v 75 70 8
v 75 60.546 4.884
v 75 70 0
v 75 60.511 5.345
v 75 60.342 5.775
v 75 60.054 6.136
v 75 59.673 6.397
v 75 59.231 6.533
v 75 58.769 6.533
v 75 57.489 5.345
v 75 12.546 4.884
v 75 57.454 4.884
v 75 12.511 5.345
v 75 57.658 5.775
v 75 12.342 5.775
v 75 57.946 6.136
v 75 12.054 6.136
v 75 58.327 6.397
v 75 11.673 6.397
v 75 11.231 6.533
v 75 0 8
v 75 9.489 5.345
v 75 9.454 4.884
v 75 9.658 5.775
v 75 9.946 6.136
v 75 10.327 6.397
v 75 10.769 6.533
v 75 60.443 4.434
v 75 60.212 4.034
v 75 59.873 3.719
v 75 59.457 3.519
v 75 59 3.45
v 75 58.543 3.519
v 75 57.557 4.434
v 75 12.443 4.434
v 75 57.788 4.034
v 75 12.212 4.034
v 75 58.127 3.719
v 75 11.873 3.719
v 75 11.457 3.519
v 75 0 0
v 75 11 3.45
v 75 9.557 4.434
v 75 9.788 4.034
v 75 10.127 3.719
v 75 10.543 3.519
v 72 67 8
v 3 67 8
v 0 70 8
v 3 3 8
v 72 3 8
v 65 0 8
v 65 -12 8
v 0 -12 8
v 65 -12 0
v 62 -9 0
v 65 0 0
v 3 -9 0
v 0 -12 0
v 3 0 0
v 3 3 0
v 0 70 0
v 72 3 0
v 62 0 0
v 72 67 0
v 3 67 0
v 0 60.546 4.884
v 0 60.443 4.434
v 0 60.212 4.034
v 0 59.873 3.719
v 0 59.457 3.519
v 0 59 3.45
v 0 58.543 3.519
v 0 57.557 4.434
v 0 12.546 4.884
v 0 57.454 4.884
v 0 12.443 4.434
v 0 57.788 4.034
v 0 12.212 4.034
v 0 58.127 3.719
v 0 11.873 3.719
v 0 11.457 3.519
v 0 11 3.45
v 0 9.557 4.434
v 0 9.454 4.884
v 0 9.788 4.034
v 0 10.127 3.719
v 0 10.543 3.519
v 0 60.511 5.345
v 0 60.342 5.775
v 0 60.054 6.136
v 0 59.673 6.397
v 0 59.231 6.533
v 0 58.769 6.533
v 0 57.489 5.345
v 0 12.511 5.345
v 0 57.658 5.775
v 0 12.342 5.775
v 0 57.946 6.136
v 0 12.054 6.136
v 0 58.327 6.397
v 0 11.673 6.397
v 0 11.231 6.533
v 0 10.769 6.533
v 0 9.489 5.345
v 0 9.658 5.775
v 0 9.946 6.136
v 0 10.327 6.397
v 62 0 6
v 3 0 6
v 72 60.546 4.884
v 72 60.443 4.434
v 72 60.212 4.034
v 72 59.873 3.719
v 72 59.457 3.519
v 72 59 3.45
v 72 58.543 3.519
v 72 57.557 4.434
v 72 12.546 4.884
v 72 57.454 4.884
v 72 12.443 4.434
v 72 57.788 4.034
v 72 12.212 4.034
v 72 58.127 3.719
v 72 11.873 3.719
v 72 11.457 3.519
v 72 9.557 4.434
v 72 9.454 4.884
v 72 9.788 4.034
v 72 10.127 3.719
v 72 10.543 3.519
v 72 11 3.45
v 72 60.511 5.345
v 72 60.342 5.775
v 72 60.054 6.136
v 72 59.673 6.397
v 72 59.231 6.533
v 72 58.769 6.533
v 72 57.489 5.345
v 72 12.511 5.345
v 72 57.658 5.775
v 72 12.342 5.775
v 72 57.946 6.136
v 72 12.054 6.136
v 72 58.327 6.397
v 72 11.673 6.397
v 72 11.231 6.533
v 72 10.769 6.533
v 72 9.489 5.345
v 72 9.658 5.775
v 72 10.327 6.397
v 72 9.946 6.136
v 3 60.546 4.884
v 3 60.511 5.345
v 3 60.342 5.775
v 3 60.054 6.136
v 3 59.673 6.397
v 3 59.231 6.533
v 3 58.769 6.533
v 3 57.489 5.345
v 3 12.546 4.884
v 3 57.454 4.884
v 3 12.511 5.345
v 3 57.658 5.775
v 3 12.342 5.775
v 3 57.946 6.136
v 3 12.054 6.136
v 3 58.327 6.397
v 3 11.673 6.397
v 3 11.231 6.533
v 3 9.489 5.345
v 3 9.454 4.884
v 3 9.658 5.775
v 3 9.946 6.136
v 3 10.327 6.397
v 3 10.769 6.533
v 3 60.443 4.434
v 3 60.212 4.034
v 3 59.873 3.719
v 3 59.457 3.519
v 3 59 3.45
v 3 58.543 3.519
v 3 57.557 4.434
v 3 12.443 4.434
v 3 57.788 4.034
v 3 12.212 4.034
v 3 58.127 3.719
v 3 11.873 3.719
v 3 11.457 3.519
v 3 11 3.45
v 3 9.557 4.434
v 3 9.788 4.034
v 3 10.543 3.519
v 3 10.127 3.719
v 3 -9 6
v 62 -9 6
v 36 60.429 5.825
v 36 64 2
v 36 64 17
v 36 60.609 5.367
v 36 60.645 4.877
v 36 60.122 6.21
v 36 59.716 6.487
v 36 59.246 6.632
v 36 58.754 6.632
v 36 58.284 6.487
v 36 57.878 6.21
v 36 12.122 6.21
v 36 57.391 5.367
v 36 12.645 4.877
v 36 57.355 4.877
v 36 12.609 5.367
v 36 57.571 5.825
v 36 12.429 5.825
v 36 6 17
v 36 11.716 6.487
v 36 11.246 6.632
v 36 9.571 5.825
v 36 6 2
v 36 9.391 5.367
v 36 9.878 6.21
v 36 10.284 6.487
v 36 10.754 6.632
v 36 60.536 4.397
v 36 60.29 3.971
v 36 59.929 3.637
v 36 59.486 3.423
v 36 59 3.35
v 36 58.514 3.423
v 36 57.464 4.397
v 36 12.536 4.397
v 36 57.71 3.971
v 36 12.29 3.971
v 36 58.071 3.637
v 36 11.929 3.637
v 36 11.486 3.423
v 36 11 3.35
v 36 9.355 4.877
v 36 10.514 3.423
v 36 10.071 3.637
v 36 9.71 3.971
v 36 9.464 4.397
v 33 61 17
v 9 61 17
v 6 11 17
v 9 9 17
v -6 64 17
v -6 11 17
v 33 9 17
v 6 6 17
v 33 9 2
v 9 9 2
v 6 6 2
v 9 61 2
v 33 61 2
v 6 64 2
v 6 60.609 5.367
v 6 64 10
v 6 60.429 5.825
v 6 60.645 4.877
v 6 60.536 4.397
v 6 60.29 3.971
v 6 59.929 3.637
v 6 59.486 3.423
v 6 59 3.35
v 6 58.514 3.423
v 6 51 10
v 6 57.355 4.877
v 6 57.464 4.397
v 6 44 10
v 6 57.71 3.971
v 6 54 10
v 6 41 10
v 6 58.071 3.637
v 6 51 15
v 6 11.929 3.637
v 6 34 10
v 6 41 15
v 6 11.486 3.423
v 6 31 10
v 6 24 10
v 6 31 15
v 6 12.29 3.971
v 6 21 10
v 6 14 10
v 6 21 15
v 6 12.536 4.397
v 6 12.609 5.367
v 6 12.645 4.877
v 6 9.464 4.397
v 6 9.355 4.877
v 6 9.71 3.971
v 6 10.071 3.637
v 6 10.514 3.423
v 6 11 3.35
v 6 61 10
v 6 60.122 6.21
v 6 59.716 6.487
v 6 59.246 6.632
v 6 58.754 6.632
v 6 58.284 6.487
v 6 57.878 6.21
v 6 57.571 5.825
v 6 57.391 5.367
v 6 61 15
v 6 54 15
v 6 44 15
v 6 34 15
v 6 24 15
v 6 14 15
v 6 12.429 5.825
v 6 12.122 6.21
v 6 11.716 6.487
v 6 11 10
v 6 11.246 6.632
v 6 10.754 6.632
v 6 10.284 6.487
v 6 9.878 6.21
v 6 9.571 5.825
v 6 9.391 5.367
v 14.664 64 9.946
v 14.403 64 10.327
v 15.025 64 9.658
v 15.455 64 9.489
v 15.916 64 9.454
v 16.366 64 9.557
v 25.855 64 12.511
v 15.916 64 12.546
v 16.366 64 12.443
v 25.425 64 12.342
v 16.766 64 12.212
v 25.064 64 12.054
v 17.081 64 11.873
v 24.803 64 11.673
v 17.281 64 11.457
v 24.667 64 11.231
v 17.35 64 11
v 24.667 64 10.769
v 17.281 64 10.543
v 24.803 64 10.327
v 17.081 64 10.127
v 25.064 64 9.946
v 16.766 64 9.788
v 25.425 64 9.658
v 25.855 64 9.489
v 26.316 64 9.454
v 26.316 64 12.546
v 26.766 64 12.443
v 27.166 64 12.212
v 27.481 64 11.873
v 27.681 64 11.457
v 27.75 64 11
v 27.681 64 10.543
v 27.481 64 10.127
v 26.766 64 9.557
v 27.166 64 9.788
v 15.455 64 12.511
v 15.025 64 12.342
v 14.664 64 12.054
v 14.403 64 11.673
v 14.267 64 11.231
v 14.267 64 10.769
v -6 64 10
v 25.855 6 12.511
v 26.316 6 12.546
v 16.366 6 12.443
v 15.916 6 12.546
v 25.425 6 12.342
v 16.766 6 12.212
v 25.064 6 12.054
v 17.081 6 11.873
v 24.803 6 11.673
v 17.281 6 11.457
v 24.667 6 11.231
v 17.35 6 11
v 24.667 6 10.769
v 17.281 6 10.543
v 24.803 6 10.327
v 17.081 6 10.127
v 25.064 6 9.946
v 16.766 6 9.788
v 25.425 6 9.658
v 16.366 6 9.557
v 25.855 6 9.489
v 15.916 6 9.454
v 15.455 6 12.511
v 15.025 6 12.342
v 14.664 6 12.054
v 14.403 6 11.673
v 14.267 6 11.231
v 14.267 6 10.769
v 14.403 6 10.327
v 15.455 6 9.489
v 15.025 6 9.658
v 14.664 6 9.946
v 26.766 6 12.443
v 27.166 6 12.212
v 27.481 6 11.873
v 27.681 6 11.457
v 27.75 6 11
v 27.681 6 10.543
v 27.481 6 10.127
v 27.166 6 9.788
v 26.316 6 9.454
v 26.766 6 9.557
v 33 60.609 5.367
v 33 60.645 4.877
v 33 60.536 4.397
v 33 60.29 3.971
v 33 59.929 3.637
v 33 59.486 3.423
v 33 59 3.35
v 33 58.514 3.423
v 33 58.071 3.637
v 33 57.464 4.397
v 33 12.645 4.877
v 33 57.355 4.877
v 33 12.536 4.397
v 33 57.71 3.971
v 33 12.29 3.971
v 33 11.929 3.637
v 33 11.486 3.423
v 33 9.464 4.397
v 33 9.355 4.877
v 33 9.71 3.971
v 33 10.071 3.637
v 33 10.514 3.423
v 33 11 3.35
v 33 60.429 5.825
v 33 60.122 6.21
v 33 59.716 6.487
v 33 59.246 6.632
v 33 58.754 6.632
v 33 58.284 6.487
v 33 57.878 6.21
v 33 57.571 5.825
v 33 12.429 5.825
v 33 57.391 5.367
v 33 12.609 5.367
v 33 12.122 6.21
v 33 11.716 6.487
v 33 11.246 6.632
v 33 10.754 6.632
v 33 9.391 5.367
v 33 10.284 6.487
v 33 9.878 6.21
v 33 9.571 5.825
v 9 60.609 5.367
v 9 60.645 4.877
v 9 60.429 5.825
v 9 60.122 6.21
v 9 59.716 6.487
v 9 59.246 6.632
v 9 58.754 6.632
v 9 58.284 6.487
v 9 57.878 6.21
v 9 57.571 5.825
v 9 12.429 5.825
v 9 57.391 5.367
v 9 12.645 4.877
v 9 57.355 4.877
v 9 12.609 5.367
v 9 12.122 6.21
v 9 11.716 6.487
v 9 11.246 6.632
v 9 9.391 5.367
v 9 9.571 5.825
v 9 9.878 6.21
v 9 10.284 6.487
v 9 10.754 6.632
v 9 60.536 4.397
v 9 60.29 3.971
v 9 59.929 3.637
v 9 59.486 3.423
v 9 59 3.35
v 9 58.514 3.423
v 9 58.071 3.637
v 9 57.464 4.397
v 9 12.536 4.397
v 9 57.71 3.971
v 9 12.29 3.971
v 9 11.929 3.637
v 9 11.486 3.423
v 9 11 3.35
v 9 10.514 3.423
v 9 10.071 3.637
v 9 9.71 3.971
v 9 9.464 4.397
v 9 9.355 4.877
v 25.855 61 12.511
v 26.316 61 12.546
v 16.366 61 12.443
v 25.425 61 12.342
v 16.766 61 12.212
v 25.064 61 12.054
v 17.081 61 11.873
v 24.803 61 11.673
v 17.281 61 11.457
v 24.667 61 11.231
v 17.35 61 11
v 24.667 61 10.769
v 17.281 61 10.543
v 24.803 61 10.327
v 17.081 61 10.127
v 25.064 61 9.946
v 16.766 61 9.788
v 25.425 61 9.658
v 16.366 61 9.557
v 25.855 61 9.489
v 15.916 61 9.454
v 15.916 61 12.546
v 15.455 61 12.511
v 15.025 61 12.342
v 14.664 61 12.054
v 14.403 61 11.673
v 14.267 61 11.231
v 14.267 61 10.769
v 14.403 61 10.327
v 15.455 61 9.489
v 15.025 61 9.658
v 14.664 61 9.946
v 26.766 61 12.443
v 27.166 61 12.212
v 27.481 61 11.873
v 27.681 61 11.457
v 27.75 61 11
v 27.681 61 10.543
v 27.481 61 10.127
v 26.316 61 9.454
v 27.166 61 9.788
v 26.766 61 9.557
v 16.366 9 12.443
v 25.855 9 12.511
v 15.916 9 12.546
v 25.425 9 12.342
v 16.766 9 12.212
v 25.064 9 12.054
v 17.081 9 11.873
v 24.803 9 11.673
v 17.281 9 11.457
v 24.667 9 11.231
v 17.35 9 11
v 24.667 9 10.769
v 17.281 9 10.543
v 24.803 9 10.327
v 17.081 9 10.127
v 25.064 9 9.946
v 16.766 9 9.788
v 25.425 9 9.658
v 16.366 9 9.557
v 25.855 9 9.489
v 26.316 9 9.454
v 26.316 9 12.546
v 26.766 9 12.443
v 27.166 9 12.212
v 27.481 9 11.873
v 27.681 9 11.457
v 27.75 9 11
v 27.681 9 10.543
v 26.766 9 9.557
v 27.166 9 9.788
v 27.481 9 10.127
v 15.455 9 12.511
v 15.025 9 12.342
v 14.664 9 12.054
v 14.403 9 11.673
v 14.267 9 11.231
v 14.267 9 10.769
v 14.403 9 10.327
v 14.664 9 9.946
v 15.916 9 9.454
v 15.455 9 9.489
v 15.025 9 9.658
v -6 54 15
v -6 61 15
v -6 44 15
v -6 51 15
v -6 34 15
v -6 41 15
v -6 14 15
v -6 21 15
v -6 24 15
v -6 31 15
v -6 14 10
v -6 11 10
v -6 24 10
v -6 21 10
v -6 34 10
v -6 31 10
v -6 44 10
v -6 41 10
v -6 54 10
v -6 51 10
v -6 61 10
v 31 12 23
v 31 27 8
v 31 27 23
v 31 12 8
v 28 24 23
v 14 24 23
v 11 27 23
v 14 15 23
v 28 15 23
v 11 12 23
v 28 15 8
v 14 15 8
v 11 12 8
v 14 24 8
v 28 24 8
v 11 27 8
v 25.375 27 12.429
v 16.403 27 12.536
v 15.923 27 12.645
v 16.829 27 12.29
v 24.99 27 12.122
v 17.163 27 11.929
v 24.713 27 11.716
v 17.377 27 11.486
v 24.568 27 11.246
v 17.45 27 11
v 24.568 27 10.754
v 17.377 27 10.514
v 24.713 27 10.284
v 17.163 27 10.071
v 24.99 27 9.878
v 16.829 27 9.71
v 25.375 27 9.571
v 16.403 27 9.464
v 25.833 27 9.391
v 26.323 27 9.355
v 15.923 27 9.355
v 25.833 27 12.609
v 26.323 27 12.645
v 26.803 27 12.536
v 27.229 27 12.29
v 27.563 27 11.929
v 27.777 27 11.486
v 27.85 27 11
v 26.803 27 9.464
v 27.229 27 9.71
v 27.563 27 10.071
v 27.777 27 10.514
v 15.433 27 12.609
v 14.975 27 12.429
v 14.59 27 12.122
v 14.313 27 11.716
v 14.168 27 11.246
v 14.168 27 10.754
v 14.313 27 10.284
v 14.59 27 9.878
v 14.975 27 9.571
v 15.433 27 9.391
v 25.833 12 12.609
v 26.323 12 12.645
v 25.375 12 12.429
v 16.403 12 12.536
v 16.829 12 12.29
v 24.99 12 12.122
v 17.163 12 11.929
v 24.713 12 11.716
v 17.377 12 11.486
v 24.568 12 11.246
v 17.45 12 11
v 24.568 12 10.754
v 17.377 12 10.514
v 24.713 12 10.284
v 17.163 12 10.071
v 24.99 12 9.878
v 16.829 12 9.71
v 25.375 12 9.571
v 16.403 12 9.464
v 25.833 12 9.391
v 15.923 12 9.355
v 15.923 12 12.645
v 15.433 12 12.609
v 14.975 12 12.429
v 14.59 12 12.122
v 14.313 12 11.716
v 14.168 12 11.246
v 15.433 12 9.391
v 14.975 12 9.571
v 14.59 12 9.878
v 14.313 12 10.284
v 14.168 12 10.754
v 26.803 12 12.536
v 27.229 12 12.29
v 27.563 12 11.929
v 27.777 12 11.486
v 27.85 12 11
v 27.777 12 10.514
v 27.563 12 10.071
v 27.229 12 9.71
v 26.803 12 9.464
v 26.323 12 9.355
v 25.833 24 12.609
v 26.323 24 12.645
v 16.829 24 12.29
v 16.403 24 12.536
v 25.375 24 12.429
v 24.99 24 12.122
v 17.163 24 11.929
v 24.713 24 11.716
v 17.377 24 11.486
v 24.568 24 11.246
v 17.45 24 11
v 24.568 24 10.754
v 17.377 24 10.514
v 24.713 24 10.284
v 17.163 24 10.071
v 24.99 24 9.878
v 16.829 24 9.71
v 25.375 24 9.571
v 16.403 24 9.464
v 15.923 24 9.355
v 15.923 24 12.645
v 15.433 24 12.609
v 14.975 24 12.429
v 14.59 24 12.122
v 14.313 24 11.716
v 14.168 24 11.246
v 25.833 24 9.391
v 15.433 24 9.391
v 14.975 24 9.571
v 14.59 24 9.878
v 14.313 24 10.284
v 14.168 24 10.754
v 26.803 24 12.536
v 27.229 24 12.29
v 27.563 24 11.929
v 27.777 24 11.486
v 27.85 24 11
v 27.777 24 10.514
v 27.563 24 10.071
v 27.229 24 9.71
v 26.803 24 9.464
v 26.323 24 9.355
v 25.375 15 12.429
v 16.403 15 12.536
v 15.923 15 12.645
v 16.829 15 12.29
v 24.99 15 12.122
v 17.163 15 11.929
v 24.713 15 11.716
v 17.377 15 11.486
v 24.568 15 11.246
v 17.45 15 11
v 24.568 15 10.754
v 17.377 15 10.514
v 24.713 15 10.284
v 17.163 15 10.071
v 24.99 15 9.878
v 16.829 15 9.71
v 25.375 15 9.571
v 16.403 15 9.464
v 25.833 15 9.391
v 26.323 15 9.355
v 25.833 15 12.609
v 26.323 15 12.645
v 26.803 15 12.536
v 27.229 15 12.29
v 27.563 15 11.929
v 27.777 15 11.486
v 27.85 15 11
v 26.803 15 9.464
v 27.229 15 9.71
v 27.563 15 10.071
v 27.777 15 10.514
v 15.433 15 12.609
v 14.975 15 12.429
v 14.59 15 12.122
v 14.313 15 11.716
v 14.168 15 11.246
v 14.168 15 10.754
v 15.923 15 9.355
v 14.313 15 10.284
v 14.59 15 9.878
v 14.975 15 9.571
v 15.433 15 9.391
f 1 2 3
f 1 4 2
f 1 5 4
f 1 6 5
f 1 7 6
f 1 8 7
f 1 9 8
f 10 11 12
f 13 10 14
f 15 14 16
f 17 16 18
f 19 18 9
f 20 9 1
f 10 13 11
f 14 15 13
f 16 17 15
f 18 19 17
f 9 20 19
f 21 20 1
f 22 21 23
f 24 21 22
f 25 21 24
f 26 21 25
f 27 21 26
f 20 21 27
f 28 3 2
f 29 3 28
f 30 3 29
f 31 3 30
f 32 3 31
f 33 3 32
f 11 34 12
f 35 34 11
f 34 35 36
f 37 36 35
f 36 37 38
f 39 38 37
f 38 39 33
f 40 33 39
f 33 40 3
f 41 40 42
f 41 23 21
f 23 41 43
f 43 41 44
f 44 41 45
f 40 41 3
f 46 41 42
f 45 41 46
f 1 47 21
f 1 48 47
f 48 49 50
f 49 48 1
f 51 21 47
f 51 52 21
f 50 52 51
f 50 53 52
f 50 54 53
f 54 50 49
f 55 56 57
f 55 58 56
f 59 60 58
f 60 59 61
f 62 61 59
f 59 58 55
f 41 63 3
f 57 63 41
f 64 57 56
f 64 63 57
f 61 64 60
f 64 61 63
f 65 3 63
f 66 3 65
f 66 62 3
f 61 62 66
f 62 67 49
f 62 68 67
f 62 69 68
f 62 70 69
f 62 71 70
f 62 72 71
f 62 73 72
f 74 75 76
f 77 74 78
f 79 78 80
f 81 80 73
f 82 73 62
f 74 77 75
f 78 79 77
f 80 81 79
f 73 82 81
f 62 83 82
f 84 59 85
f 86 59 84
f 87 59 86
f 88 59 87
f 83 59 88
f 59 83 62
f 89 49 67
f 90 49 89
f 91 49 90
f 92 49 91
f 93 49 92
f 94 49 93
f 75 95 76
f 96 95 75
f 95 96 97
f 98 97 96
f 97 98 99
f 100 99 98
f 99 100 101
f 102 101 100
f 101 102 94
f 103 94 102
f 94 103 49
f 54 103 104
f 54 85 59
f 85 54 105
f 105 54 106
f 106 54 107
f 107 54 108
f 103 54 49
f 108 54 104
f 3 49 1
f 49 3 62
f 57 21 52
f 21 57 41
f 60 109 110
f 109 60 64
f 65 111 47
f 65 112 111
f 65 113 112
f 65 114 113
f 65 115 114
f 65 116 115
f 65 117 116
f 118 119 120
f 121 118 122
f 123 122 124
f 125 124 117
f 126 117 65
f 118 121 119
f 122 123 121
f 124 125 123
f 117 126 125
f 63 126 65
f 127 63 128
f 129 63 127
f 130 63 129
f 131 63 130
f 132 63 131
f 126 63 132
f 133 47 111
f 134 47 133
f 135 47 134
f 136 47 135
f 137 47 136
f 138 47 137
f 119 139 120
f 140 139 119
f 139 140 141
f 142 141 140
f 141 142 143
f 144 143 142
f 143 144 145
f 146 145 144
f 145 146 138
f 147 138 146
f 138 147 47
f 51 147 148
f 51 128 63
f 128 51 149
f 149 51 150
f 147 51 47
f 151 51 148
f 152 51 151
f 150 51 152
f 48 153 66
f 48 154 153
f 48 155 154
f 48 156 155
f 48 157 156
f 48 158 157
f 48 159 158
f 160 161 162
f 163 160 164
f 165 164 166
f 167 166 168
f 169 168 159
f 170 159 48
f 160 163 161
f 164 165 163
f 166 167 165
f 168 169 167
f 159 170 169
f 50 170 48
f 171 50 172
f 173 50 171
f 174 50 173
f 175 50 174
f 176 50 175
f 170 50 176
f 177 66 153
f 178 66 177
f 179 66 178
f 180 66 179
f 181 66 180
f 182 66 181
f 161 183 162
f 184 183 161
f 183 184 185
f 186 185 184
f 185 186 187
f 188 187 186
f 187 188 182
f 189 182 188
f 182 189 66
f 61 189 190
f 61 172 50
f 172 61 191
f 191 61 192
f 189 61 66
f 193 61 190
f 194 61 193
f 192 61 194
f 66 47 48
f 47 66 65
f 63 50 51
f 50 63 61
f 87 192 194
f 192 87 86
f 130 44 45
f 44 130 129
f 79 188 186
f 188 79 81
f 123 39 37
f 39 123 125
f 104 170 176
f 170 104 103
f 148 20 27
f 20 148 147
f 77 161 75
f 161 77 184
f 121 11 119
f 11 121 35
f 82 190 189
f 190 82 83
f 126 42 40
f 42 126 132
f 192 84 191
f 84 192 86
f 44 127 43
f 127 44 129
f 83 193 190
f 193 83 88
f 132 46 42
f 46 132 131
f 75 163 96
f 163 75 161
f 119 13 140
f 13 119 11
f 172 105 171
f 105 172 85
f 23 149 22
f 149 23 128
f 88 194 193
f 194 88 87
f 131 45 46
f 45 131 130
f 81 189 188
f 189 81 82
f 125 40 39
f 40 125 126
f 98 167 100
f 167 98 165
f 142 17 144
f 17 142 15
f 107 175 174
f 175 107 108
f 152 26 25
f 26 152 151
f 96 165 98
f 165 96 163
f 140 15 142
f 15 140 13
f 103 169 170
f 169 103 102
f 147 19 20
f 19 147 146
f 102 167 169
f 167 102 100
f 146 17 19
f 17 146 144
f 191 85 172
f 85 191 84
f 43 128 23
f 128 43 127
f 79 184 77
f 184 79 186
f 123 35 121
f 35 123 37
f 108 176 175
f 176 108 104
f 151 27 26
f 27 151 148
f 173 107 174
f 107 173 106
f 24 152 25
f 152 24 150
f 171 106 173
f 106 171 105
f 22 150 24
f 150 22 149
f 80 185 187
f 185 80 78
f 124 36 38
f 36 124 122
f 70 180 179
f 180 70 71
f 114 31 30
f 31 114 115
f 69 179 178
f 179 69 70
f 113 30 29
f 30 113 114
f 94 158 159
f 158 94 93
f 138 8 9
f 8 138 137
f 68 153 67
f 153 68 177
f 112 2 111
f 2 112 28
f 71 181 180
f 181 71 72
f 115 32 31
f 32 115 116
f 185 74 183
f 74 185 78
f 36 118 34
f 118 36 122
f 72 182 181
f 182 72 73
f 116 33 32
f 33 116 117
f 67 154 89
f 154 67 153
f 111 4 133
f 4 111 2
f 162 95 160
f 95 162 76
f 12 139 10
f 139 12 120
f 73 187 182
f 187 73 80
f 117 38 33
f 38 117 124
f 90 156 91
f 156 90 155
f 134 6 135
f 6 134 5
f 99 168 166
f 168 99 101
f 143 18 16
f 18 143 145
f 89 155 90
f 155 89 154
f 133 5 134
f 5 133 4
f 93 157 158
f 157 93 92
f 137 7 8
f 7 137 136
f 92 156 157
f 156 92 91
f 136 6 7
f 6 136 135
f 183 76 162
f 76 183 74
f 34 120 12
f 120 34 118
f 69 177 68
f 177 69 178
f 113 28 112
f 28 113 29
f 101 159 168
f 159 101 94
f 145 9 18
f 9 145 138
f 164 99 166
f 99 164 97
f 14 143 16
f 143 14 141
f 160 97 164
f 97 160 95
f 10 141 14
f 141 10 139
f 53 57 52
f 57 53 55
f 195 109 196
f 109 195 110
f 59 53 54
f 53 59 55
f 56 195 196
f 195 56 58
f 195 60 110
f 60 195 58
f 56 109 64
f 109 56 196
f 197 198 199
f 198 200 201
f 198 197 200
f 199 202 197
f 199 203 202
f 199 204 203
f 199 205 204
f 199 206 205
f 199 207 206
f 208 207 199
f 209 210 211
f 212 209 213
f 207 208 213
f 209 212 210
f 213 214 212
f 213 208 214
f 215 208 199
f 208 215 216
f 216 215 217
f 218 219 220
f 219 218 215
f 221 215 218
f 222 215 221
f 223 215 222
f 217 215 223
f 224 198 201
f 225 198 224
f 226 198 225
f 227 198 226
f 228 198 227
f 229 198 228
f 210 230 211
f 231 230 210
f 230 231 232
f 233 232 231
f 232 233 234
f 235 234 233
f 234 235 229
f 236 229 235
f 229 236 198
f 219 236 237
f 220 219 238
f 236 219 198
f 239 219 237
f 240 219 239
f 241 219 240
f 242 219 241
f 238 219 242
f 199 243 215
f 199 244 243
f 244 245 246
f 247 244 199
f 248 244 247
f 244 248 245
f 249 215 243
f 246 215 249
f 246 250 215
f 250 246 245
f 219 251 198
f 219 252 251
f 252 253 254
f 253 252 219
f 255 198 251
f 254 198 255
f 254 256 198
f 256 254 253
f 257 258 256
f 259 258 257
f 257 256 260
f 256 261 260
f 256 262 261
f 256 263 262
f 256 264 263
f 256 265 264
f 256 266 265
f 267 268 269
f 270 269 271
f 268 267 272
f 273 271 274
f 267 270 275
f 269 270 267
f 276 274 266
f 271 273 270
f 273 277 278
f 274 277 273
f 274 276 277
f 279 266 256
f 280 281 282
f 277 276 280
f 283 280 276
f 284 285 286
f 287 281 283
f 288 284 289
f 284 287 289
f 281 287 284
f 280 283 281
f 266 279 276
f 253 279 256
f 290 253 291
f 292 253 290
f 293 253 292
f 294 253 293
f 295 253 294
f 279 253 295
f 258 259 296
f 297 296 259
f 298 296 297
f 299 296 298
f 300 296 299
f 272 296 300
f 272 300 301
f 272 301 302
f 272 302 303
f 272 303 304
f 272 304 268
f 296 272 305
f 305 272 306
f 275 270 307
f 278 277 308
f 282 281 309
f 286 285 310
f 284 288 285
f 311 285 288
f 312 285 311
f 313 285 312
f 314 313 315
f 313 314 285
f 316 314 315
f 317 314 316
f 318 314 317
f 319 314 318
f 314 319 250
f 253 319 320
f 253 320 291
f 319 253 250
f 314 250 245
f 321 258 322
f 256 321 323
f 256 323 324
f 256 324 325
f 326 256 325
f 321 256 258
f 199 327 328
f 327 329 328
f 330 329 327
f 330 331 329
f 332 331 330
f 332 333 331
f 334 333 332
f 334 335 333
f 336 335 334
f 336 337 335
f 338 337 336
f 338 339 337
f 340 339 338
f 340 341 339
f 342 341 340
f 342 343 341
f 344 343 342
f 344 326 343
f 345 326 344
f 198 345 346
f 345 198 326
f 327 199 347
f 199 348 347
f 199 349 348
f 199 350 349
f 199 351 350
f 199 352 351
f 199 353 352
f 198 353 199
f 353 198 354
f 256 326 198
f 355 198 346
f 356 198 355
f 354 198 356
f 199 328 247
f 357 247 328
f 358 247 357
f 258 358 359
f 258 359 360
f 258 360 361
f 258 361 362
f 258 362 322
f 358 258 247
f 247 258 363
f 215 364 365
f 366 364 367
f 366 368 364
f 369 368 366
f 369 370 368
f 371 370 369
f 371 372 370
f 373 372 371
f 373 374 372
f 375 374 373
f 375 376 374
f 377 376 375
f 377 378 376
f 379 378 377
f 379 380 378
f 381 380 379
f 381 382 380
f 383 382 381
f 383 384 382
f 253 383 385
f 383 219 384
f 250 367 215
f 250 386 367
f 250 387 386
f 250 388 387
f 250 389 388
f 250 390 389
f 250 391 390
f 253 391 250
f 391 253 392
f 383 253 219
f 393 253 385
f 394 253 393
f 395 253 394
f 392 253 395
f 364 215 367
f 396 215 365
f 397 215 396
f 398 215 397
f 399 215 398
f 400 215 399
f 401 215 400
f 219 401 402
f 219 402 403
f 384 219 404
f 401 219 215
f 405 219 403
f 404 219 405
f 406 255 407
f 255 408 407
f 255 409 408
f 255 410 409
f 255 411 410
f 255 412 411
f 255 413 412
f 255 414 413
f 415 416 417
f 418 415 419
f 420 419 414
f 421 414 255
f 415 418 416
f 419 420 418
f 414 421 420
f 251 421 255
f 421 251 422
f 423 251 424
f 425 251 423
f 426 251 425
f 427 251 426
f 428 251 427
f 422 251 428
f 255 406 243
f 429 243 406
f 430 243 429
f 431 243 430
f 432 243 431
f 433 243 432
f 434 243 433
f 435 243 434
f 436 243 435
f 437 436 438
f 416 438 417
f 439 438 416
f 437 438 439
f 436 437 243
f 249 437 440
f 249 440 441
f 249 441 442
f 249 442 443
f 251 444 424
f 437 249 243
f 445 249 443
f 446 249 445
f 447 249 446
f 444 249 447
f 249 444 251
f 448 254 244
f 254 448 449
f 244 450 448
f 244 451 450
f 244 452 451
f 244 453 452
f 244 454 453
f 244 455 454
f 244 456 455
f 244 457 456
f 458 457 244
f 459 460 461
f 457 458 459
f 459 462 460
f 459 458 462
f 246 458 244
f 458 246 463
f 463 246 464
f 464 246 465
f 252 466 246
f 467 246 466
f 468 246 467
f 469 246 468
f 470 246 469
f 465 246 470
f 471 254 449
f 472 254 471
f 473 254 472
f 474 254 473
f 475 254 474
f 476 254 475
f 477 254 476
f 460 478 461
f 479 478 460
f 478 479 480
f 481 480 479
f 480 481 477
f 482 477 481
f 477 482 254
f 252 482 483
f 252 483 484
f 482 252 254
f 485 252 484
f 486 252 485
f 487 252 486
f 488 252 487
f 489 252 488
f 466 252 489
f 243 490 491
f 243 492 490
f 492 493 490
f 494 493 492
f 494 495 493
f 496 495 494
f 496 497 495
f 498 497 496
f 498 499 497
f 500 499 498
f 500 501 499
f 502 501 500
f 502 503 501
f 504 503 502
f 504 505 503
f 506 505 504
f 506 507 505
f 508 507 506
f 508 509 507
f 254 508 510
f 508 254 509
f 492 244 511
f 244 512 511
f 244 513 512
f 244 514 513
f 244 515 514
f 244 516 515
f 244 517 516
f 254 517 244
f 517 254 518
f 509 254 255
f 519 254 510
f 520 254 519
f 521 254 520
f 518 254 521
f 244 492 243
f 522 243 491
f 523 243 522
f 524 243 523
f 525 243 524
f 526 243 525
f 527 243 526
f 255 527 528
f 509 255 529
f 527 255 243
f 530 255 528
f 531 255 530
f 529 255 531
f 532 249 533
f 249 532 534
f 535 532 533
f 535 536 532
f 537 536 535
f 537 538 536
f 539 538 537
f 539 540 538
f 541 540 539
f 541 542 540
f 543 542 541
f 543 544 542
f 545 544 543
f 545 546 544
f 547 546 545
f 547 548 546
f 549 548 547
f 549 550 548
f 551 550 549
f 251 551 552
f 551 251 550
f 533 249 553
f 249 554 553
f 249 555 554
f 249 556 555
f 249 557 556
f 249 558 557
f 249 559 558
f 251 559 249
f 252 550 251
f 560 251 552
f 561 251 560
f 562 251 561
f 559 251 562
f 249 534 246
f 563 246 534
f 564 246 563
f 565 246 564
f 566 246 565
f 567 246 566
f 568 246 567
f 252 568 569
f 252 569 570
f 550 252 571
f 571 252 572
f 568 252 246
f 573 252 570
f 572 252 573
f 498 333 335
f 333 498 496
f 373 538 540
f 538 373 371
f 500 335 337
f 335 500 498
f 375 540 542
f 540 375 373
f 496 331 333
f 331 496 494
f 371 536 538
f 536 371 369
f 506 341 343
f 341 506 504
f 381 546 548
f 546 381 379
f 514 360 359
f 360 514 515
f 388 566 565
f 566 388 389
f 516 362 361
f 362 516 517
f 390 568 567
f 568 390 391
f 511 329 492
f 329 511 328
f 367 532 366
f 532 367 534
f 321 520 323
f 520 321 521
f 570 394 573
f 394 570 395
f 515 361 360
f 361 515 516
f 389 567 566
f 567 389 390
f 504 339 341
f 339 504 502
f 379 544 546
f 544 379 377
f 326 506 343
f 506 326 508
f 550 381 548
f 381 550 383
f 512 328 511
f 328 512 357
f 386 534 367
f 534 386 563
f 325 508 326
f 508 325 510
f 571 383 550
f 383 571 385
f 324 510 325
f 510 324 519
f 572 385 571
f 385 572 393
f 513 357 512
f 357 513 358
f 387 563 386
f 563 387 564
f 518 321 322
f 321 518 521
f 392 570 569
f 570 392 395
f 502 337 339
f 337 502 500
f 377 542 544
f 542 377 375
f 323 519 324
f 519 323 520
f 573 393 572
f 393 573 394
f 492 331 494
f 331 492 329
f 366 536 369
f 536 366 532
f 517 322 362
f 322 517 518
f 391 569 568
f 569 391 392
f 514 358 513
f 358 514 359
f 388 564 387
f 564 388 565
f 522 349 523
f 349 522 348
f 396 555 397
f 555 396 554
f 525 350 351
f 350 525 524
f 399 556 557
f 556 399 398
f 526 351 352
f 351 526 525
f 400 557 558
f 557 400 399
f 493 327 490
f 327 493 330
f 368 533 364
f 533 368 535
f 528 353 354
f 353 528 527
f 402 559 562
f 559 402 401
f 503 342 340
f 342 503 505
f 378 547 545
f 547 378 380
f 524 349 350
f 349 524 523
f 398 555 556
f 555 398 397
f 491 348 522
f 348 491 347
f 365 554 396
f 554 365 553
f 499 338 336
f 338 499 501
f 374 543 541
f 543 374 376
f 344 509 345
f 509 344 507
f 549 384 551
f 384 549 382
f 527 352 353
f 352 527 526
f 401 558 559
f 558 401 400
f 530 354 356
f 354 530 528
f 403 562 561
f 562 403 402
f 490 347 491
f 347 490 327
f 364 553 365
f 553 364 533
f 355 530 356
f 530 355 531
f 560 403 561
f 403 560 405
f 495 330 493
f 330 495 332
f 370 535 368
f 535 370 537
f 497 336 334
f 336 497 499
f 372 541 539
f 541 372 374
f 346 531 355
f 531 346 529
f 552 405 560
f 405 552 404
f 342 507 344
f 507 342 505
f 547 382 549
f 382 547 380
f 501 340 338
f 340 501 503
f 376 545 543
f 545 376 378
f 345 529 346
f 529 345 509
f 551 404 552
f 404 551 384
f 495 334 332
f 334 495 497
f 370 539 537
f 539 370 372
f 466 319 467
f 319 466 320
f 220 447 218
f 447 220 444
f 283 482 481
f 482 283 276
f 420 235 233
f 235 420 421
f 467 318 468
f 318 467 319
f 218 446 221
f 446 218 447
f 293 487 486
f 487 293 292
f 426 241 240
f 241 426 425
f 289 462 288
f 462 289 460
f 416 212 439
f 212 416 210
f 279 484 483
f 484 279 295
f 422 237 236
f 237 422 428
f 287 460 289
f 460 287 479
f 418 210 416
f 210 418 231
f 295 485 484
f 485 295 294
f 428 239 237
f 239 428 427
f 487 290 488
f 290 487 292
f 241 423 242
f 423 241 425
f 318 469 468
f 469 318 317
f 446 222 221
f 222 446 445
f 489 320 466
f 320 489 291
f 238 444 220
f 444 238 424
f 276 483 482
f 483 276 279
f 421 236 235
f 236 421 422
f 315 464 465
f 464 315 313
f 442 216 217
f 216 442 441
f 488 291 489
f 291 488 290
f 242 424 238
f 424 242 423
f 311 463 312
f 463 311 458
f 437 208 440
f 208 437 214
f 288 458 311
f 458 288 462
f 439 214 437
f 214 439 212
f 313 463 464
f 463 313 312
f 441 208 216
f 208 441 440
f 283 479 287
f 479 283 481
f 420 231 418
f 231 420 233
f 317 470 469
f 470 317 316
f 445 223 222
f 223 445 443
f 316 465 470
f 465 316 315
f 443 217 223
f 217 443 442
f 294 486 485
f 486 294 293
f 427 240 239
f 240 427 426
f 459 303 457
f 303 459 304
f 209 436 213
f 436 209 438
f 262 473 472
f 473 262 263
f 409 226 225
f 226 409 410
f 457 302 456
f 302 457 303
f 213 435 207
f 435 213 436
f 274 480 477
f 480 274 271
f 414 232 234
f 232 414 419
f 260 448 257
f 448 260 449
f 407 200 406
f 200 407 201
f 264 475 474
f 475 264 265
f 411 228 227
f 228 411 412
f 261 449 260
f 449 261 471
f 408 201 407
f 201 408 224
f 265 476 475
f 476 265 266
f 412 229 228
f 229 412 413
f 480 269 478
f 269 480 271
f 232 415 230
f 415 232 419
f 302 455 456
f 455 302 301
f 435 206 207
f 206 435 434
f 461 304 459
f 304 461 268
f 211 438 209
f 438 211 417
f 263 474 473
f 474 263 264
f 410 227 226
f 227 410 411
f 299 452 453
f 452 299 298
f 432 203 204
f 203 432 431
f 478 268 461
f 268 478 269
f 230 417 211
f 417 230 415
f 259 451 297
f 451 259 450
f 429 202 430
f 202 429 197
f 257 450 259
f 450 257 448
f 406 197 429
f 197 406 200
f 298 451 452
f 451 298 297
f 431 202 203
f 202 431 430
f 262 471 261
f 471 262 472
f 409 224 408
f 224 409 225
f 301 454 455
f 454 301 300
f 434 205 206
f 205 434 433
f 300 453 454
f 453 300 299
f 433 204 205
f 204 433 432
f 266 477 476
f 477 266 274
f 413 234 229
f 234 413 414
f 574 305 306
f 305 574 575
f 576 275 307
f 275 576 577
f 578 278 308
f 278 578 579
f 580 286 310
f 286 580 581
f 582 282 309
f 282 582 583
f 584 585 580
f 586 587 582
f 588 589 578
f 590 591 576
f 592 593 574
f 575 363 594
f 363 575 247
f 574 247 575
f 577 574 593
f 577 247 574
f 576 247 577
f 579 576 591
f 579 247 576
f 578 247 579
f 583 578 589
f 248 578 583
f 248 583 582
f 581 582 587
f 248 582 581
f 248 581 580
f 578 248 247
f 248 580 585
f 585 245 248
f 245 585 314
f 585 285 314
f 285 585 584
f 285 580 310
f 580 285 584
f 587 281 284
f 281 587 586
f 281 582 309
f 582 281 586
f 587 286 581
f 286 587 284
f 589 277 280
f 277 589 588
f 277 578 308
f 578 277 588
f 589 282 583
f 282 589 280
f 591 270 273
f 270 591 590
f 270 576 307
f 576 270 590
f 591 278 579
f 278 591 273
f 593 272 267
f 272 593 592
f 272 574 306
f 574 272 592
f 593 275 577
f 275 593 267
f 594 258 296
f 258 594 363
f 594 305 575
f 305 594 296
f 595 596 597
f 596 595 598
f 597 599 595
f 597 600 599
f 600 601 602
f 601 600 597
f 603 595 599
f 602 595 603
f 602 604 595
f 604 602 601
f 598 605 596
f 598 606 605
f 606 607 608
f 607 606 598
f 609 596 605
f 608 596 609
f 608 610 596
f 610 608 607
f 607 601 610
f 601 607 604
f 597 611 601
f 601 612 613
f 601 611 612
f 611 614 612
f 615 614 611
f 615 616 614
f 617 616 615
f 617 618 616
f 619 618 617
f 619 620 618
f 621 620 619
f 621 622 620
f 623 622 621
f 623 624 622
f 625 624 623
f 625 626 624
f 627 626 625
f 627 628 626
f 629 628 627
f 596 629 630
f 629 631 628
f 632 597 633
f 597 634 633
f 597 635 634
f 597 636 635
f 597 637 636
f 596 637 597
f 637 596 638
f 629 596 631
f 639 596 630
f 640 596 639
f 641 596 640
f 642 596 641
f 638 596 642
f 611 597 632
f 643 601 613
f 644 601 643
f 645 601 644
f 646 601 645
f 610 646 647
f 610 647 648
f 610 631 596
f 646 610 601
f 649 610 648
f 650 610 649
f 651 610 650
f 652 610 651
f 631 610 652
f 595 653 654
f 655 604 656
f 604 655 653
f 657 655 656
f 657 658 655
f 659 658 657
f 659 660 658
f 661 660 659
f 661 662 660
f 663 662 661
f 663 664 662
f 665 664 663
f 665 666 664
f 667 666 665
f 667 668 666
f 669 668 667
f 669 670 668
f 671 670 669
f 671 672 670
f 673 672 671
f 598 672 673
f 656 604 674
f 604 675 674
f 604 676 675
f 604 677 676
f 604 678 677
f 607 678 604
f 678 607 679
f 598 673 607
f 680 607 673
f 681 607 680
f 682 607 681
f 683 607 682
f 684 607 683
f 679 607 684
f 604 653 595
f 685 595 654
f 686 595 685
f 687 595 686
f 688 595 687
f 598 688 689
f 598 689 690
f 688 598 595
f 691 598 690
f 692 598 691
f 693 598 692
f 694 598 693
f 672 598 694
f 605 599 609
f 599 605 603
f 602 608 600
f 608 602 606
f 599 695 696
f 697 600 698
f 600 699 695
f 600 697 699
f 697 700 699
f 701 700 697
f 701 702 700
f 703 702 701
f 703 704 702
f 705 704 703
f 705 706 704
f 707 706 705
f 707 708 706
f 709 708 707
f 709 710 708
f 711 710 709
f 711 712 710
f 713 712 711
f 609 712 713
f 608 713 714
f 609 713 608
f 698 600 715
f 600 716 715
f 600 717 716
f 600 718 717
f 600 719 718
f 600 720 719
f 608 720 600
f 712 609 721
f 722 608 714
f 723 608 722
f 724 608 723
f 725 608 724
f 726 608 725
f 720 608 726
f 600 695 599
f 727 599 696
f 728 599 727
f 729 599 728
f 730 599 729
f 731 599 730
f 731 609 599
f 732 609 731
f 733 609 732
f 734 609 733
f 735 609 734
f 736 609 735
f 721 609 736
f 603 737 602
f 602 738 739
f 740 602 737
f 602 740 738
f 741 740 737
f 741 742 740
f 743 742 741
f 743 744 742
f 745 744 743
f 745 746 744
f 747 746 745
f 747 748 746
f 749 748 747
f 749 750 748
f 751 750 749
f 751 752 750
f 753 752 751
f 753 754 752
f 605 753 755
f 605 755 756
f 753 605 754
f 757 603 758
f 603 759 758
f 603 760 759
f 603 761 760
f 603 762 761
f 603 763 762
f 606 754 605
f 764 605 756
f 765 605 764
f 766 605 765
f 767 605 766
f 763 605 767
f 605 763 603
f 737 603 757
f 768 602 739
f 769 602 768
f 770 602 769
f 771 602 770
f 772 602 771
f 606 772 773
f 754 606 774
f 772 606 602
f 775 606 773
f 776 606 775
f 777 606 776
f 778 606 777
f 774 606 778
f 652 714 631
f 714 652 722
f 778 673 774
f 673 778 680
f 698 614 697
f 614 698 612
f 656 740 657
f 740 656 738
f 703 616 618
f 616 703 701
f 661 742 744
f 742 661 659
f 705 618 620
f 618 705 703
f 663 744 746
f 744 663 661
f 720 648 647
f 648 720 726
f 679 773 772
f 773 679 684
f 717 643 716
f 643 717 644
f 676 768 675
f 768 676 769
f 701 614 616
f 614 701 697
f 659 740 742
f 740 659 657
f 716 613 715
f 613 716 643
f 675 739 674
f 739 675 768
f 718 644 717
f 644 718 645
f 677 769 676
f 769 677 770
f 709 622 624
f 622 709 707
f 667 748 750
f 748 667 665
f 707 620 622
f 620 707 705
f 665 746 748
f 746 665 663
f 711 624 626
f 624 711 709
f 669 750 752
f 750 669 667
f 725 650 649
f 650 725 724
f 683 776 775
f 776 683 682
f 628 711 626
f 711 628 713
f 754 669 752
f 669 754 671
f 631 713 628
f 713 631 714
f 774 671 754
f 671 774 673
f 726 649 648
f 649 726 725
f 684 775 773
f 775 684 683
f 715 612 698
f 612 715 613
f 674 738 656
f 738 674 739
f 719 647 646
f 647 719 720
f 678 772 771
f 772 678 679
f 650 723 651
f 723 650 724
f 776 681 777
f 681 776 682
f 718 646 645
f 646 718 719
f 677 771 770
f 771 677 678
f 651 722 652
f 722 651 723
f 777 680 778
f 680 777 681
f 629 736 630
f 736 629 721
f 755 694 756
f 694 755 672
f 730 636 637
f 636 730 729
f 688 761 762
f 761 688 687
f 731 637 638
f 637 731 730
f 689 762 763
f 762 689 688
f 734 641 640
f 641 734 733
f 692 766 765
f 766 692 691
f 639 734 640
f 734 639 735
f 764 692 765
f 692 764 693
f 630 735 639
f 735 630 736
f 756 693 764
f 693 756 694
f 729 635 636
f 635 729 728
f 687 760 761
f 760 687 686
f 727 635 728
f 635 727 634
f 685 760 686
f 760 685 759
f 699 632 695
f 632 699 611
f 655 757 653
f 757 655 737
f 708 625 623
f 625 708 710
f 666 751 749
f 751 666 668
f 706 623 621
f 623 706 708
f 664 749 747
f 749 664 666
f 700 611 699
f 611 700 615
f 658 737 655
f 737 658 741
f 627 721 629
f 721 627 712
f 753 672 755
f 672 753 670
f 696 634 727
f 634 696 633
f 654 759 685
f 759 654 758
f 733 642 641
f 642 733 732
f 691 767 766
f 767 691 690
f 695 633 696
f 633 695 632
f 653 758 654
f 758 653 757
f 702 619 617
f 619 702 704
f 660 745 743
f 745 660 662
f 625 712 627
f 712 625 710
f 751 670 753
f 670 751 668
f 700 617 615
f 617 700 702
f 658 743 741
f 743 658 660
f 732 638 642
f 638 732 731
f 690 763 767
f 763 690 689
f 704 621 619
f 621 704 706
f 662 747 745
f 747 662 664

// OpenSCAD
$fn=21;

r1=3.1;
r2=3.3;

// OUTER
union() {
    difference() { 
        cube([75, 70, 8]);   
        translate([3,3,-1])
            cube([69, 64, 12]);    
        #translate([-0.1, 11, 5])
            rotate([0,90,0])
            cylinder(r=r1/2, h=75.2);    
        #translate([-0.1, 59, 5])
            rotate([0,90,0])
            cylinder(r=r1/2, h=75.2);
    }
    translate([0,-12,6])
        cube([65, 12, 2]);
    translate([0,-12,0])
        cube([65, 3, 6]);
    translate([0,-9,0])
        cube([3, 9, 6]);
    translate([62,-9,0])
        cube([3, 9, 6]);
}

//INNER
union() {
    difference() { 
        translate([6,6,2])
            cube([30, 58, 15]);   
        translate([9,9,1])
            cube([24, 52, 17]);    
        #translate([15.8, 64.9, 11])
            rotate([90,0,0])
            cylinder(r=r1/2, h=59.0);    
        #translate([26.2, 64.9, 11])
            rotate([90,0,0])
            cylinder(r=r1/2, h=59.0);
        translate([-0.1, 11, 5])
            rotate([0,90,0])
            cylinder(r=r2/2, h=75.2);    
        translate([-0.1, 59, 5])
            rotate([0,90,0])
            cylinder(r=r2/2, h=75.2);
    }
    translate([-6,11,15])
        cube([12, 53, 2]);
    #translate([-6,11,10])
        cube([12, 3, 5]);
    #translate([-6,21,10])
        cube([12, 3, 5]);
    #translate([-6,31,10])
        cube([12, 3, 5]);
    #translate([-6,41,10])
        cube([12, 3, 5]);
    #translate([-6,51,10])
        cube([12, 3, 5]);
    #translate([-6,61,10])
        cube([12, 3, 5]);
}


difference() { 
    translate([11,12,8])
        cube([20, 15, 15]);   
    translate([14, 15,-1])
        cube([14, 9, 37]);    
    translate([15.8, 64.9, 11])
        rotate([90,0,0])
        cylinder(r=r2/2, h=59.0);    
    translate([26.2, 64.9, 11])
        rotate([90,0,0])
        cylinder(r=r2/2, h=59.0);
}
